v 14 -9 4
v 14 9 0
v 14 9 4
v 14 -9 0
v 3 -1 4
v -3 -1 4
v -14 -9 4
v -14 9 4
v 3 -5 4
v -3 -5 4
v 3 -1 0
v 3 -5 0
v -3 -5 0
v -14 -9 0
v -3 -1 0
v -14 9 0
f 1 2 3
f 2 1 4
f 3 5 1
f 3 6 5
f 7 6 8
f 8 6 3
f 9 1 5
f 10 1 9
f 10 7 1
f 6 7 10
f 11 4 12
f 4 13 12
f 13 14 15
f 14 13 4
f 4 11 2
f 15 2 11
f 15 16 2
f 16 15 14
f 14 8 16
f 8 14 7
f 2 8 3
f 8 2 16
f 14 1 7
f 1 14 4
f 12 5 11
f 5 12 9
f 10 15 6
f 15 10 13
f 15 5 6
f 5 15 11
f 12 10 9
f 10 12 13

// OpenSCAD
// Auto-generated from tests/data/feature_fixtures_manifest.json
// fixture: plate_rectangular_through_cutout
// fixture_type: plate
// description: Plate with one axis-aligned rectangular through-cutout sized for conservative cuboid difference reconstruction.
$fn = 96;

plate_size = [28.000000, 18.000000, 4.000000];
plate_origin = [-14.000000, -9.000000, 0.000000];

module through_hole(center, diameter, height) {
  translate(center) cylinder(d=diameter, h=height, center=false);
}

module through_slot(start, end, width, height) {
  hull() {
    through_hole(start, width, height);
    through_hole(end, width, height);
  }
}

module counterbore_hole(center, through_d, bore_d, bore_depth, plate_thickness) {
  translate([center[0], center[1], -0.1])
    cylinder(d=through_d, h=plate_thickness + 0.2, center=false);
  translate([center[0], center[1], plate_thickness - bore_depth])
    cylinder(d=bore_d, h=bore_depth + 0.1, center=false);
}

module rectangular_through_cutout(center, size_xy, plate_thickness) {
  translate([center[0] - size_xy[0] / 2, center[1] - size_xy[1] / 2, -0.1])
    cube([size_xy[0], size_xy[1], plate_thickness + 0.2]);
}

module rectangular_top_pocket(center, size_xy, pocket_depth, plate_thickness) {
  translate([center[0] - size_xy[0] / 2, center[1] - size_xy[1] / 2, plate_thickness - pocket_depth])
    cube([size_xy[0], size_xy[1], pocket_depth + 0.1]);
}

difference() {
  translate(plate_origin) cube(plate_size);
  rectangular_through_cutout([0.000000, -3.000000, 0.000000], [6.000000, 4.000000], 4.000000);  // rectangular_cutout_0
}
